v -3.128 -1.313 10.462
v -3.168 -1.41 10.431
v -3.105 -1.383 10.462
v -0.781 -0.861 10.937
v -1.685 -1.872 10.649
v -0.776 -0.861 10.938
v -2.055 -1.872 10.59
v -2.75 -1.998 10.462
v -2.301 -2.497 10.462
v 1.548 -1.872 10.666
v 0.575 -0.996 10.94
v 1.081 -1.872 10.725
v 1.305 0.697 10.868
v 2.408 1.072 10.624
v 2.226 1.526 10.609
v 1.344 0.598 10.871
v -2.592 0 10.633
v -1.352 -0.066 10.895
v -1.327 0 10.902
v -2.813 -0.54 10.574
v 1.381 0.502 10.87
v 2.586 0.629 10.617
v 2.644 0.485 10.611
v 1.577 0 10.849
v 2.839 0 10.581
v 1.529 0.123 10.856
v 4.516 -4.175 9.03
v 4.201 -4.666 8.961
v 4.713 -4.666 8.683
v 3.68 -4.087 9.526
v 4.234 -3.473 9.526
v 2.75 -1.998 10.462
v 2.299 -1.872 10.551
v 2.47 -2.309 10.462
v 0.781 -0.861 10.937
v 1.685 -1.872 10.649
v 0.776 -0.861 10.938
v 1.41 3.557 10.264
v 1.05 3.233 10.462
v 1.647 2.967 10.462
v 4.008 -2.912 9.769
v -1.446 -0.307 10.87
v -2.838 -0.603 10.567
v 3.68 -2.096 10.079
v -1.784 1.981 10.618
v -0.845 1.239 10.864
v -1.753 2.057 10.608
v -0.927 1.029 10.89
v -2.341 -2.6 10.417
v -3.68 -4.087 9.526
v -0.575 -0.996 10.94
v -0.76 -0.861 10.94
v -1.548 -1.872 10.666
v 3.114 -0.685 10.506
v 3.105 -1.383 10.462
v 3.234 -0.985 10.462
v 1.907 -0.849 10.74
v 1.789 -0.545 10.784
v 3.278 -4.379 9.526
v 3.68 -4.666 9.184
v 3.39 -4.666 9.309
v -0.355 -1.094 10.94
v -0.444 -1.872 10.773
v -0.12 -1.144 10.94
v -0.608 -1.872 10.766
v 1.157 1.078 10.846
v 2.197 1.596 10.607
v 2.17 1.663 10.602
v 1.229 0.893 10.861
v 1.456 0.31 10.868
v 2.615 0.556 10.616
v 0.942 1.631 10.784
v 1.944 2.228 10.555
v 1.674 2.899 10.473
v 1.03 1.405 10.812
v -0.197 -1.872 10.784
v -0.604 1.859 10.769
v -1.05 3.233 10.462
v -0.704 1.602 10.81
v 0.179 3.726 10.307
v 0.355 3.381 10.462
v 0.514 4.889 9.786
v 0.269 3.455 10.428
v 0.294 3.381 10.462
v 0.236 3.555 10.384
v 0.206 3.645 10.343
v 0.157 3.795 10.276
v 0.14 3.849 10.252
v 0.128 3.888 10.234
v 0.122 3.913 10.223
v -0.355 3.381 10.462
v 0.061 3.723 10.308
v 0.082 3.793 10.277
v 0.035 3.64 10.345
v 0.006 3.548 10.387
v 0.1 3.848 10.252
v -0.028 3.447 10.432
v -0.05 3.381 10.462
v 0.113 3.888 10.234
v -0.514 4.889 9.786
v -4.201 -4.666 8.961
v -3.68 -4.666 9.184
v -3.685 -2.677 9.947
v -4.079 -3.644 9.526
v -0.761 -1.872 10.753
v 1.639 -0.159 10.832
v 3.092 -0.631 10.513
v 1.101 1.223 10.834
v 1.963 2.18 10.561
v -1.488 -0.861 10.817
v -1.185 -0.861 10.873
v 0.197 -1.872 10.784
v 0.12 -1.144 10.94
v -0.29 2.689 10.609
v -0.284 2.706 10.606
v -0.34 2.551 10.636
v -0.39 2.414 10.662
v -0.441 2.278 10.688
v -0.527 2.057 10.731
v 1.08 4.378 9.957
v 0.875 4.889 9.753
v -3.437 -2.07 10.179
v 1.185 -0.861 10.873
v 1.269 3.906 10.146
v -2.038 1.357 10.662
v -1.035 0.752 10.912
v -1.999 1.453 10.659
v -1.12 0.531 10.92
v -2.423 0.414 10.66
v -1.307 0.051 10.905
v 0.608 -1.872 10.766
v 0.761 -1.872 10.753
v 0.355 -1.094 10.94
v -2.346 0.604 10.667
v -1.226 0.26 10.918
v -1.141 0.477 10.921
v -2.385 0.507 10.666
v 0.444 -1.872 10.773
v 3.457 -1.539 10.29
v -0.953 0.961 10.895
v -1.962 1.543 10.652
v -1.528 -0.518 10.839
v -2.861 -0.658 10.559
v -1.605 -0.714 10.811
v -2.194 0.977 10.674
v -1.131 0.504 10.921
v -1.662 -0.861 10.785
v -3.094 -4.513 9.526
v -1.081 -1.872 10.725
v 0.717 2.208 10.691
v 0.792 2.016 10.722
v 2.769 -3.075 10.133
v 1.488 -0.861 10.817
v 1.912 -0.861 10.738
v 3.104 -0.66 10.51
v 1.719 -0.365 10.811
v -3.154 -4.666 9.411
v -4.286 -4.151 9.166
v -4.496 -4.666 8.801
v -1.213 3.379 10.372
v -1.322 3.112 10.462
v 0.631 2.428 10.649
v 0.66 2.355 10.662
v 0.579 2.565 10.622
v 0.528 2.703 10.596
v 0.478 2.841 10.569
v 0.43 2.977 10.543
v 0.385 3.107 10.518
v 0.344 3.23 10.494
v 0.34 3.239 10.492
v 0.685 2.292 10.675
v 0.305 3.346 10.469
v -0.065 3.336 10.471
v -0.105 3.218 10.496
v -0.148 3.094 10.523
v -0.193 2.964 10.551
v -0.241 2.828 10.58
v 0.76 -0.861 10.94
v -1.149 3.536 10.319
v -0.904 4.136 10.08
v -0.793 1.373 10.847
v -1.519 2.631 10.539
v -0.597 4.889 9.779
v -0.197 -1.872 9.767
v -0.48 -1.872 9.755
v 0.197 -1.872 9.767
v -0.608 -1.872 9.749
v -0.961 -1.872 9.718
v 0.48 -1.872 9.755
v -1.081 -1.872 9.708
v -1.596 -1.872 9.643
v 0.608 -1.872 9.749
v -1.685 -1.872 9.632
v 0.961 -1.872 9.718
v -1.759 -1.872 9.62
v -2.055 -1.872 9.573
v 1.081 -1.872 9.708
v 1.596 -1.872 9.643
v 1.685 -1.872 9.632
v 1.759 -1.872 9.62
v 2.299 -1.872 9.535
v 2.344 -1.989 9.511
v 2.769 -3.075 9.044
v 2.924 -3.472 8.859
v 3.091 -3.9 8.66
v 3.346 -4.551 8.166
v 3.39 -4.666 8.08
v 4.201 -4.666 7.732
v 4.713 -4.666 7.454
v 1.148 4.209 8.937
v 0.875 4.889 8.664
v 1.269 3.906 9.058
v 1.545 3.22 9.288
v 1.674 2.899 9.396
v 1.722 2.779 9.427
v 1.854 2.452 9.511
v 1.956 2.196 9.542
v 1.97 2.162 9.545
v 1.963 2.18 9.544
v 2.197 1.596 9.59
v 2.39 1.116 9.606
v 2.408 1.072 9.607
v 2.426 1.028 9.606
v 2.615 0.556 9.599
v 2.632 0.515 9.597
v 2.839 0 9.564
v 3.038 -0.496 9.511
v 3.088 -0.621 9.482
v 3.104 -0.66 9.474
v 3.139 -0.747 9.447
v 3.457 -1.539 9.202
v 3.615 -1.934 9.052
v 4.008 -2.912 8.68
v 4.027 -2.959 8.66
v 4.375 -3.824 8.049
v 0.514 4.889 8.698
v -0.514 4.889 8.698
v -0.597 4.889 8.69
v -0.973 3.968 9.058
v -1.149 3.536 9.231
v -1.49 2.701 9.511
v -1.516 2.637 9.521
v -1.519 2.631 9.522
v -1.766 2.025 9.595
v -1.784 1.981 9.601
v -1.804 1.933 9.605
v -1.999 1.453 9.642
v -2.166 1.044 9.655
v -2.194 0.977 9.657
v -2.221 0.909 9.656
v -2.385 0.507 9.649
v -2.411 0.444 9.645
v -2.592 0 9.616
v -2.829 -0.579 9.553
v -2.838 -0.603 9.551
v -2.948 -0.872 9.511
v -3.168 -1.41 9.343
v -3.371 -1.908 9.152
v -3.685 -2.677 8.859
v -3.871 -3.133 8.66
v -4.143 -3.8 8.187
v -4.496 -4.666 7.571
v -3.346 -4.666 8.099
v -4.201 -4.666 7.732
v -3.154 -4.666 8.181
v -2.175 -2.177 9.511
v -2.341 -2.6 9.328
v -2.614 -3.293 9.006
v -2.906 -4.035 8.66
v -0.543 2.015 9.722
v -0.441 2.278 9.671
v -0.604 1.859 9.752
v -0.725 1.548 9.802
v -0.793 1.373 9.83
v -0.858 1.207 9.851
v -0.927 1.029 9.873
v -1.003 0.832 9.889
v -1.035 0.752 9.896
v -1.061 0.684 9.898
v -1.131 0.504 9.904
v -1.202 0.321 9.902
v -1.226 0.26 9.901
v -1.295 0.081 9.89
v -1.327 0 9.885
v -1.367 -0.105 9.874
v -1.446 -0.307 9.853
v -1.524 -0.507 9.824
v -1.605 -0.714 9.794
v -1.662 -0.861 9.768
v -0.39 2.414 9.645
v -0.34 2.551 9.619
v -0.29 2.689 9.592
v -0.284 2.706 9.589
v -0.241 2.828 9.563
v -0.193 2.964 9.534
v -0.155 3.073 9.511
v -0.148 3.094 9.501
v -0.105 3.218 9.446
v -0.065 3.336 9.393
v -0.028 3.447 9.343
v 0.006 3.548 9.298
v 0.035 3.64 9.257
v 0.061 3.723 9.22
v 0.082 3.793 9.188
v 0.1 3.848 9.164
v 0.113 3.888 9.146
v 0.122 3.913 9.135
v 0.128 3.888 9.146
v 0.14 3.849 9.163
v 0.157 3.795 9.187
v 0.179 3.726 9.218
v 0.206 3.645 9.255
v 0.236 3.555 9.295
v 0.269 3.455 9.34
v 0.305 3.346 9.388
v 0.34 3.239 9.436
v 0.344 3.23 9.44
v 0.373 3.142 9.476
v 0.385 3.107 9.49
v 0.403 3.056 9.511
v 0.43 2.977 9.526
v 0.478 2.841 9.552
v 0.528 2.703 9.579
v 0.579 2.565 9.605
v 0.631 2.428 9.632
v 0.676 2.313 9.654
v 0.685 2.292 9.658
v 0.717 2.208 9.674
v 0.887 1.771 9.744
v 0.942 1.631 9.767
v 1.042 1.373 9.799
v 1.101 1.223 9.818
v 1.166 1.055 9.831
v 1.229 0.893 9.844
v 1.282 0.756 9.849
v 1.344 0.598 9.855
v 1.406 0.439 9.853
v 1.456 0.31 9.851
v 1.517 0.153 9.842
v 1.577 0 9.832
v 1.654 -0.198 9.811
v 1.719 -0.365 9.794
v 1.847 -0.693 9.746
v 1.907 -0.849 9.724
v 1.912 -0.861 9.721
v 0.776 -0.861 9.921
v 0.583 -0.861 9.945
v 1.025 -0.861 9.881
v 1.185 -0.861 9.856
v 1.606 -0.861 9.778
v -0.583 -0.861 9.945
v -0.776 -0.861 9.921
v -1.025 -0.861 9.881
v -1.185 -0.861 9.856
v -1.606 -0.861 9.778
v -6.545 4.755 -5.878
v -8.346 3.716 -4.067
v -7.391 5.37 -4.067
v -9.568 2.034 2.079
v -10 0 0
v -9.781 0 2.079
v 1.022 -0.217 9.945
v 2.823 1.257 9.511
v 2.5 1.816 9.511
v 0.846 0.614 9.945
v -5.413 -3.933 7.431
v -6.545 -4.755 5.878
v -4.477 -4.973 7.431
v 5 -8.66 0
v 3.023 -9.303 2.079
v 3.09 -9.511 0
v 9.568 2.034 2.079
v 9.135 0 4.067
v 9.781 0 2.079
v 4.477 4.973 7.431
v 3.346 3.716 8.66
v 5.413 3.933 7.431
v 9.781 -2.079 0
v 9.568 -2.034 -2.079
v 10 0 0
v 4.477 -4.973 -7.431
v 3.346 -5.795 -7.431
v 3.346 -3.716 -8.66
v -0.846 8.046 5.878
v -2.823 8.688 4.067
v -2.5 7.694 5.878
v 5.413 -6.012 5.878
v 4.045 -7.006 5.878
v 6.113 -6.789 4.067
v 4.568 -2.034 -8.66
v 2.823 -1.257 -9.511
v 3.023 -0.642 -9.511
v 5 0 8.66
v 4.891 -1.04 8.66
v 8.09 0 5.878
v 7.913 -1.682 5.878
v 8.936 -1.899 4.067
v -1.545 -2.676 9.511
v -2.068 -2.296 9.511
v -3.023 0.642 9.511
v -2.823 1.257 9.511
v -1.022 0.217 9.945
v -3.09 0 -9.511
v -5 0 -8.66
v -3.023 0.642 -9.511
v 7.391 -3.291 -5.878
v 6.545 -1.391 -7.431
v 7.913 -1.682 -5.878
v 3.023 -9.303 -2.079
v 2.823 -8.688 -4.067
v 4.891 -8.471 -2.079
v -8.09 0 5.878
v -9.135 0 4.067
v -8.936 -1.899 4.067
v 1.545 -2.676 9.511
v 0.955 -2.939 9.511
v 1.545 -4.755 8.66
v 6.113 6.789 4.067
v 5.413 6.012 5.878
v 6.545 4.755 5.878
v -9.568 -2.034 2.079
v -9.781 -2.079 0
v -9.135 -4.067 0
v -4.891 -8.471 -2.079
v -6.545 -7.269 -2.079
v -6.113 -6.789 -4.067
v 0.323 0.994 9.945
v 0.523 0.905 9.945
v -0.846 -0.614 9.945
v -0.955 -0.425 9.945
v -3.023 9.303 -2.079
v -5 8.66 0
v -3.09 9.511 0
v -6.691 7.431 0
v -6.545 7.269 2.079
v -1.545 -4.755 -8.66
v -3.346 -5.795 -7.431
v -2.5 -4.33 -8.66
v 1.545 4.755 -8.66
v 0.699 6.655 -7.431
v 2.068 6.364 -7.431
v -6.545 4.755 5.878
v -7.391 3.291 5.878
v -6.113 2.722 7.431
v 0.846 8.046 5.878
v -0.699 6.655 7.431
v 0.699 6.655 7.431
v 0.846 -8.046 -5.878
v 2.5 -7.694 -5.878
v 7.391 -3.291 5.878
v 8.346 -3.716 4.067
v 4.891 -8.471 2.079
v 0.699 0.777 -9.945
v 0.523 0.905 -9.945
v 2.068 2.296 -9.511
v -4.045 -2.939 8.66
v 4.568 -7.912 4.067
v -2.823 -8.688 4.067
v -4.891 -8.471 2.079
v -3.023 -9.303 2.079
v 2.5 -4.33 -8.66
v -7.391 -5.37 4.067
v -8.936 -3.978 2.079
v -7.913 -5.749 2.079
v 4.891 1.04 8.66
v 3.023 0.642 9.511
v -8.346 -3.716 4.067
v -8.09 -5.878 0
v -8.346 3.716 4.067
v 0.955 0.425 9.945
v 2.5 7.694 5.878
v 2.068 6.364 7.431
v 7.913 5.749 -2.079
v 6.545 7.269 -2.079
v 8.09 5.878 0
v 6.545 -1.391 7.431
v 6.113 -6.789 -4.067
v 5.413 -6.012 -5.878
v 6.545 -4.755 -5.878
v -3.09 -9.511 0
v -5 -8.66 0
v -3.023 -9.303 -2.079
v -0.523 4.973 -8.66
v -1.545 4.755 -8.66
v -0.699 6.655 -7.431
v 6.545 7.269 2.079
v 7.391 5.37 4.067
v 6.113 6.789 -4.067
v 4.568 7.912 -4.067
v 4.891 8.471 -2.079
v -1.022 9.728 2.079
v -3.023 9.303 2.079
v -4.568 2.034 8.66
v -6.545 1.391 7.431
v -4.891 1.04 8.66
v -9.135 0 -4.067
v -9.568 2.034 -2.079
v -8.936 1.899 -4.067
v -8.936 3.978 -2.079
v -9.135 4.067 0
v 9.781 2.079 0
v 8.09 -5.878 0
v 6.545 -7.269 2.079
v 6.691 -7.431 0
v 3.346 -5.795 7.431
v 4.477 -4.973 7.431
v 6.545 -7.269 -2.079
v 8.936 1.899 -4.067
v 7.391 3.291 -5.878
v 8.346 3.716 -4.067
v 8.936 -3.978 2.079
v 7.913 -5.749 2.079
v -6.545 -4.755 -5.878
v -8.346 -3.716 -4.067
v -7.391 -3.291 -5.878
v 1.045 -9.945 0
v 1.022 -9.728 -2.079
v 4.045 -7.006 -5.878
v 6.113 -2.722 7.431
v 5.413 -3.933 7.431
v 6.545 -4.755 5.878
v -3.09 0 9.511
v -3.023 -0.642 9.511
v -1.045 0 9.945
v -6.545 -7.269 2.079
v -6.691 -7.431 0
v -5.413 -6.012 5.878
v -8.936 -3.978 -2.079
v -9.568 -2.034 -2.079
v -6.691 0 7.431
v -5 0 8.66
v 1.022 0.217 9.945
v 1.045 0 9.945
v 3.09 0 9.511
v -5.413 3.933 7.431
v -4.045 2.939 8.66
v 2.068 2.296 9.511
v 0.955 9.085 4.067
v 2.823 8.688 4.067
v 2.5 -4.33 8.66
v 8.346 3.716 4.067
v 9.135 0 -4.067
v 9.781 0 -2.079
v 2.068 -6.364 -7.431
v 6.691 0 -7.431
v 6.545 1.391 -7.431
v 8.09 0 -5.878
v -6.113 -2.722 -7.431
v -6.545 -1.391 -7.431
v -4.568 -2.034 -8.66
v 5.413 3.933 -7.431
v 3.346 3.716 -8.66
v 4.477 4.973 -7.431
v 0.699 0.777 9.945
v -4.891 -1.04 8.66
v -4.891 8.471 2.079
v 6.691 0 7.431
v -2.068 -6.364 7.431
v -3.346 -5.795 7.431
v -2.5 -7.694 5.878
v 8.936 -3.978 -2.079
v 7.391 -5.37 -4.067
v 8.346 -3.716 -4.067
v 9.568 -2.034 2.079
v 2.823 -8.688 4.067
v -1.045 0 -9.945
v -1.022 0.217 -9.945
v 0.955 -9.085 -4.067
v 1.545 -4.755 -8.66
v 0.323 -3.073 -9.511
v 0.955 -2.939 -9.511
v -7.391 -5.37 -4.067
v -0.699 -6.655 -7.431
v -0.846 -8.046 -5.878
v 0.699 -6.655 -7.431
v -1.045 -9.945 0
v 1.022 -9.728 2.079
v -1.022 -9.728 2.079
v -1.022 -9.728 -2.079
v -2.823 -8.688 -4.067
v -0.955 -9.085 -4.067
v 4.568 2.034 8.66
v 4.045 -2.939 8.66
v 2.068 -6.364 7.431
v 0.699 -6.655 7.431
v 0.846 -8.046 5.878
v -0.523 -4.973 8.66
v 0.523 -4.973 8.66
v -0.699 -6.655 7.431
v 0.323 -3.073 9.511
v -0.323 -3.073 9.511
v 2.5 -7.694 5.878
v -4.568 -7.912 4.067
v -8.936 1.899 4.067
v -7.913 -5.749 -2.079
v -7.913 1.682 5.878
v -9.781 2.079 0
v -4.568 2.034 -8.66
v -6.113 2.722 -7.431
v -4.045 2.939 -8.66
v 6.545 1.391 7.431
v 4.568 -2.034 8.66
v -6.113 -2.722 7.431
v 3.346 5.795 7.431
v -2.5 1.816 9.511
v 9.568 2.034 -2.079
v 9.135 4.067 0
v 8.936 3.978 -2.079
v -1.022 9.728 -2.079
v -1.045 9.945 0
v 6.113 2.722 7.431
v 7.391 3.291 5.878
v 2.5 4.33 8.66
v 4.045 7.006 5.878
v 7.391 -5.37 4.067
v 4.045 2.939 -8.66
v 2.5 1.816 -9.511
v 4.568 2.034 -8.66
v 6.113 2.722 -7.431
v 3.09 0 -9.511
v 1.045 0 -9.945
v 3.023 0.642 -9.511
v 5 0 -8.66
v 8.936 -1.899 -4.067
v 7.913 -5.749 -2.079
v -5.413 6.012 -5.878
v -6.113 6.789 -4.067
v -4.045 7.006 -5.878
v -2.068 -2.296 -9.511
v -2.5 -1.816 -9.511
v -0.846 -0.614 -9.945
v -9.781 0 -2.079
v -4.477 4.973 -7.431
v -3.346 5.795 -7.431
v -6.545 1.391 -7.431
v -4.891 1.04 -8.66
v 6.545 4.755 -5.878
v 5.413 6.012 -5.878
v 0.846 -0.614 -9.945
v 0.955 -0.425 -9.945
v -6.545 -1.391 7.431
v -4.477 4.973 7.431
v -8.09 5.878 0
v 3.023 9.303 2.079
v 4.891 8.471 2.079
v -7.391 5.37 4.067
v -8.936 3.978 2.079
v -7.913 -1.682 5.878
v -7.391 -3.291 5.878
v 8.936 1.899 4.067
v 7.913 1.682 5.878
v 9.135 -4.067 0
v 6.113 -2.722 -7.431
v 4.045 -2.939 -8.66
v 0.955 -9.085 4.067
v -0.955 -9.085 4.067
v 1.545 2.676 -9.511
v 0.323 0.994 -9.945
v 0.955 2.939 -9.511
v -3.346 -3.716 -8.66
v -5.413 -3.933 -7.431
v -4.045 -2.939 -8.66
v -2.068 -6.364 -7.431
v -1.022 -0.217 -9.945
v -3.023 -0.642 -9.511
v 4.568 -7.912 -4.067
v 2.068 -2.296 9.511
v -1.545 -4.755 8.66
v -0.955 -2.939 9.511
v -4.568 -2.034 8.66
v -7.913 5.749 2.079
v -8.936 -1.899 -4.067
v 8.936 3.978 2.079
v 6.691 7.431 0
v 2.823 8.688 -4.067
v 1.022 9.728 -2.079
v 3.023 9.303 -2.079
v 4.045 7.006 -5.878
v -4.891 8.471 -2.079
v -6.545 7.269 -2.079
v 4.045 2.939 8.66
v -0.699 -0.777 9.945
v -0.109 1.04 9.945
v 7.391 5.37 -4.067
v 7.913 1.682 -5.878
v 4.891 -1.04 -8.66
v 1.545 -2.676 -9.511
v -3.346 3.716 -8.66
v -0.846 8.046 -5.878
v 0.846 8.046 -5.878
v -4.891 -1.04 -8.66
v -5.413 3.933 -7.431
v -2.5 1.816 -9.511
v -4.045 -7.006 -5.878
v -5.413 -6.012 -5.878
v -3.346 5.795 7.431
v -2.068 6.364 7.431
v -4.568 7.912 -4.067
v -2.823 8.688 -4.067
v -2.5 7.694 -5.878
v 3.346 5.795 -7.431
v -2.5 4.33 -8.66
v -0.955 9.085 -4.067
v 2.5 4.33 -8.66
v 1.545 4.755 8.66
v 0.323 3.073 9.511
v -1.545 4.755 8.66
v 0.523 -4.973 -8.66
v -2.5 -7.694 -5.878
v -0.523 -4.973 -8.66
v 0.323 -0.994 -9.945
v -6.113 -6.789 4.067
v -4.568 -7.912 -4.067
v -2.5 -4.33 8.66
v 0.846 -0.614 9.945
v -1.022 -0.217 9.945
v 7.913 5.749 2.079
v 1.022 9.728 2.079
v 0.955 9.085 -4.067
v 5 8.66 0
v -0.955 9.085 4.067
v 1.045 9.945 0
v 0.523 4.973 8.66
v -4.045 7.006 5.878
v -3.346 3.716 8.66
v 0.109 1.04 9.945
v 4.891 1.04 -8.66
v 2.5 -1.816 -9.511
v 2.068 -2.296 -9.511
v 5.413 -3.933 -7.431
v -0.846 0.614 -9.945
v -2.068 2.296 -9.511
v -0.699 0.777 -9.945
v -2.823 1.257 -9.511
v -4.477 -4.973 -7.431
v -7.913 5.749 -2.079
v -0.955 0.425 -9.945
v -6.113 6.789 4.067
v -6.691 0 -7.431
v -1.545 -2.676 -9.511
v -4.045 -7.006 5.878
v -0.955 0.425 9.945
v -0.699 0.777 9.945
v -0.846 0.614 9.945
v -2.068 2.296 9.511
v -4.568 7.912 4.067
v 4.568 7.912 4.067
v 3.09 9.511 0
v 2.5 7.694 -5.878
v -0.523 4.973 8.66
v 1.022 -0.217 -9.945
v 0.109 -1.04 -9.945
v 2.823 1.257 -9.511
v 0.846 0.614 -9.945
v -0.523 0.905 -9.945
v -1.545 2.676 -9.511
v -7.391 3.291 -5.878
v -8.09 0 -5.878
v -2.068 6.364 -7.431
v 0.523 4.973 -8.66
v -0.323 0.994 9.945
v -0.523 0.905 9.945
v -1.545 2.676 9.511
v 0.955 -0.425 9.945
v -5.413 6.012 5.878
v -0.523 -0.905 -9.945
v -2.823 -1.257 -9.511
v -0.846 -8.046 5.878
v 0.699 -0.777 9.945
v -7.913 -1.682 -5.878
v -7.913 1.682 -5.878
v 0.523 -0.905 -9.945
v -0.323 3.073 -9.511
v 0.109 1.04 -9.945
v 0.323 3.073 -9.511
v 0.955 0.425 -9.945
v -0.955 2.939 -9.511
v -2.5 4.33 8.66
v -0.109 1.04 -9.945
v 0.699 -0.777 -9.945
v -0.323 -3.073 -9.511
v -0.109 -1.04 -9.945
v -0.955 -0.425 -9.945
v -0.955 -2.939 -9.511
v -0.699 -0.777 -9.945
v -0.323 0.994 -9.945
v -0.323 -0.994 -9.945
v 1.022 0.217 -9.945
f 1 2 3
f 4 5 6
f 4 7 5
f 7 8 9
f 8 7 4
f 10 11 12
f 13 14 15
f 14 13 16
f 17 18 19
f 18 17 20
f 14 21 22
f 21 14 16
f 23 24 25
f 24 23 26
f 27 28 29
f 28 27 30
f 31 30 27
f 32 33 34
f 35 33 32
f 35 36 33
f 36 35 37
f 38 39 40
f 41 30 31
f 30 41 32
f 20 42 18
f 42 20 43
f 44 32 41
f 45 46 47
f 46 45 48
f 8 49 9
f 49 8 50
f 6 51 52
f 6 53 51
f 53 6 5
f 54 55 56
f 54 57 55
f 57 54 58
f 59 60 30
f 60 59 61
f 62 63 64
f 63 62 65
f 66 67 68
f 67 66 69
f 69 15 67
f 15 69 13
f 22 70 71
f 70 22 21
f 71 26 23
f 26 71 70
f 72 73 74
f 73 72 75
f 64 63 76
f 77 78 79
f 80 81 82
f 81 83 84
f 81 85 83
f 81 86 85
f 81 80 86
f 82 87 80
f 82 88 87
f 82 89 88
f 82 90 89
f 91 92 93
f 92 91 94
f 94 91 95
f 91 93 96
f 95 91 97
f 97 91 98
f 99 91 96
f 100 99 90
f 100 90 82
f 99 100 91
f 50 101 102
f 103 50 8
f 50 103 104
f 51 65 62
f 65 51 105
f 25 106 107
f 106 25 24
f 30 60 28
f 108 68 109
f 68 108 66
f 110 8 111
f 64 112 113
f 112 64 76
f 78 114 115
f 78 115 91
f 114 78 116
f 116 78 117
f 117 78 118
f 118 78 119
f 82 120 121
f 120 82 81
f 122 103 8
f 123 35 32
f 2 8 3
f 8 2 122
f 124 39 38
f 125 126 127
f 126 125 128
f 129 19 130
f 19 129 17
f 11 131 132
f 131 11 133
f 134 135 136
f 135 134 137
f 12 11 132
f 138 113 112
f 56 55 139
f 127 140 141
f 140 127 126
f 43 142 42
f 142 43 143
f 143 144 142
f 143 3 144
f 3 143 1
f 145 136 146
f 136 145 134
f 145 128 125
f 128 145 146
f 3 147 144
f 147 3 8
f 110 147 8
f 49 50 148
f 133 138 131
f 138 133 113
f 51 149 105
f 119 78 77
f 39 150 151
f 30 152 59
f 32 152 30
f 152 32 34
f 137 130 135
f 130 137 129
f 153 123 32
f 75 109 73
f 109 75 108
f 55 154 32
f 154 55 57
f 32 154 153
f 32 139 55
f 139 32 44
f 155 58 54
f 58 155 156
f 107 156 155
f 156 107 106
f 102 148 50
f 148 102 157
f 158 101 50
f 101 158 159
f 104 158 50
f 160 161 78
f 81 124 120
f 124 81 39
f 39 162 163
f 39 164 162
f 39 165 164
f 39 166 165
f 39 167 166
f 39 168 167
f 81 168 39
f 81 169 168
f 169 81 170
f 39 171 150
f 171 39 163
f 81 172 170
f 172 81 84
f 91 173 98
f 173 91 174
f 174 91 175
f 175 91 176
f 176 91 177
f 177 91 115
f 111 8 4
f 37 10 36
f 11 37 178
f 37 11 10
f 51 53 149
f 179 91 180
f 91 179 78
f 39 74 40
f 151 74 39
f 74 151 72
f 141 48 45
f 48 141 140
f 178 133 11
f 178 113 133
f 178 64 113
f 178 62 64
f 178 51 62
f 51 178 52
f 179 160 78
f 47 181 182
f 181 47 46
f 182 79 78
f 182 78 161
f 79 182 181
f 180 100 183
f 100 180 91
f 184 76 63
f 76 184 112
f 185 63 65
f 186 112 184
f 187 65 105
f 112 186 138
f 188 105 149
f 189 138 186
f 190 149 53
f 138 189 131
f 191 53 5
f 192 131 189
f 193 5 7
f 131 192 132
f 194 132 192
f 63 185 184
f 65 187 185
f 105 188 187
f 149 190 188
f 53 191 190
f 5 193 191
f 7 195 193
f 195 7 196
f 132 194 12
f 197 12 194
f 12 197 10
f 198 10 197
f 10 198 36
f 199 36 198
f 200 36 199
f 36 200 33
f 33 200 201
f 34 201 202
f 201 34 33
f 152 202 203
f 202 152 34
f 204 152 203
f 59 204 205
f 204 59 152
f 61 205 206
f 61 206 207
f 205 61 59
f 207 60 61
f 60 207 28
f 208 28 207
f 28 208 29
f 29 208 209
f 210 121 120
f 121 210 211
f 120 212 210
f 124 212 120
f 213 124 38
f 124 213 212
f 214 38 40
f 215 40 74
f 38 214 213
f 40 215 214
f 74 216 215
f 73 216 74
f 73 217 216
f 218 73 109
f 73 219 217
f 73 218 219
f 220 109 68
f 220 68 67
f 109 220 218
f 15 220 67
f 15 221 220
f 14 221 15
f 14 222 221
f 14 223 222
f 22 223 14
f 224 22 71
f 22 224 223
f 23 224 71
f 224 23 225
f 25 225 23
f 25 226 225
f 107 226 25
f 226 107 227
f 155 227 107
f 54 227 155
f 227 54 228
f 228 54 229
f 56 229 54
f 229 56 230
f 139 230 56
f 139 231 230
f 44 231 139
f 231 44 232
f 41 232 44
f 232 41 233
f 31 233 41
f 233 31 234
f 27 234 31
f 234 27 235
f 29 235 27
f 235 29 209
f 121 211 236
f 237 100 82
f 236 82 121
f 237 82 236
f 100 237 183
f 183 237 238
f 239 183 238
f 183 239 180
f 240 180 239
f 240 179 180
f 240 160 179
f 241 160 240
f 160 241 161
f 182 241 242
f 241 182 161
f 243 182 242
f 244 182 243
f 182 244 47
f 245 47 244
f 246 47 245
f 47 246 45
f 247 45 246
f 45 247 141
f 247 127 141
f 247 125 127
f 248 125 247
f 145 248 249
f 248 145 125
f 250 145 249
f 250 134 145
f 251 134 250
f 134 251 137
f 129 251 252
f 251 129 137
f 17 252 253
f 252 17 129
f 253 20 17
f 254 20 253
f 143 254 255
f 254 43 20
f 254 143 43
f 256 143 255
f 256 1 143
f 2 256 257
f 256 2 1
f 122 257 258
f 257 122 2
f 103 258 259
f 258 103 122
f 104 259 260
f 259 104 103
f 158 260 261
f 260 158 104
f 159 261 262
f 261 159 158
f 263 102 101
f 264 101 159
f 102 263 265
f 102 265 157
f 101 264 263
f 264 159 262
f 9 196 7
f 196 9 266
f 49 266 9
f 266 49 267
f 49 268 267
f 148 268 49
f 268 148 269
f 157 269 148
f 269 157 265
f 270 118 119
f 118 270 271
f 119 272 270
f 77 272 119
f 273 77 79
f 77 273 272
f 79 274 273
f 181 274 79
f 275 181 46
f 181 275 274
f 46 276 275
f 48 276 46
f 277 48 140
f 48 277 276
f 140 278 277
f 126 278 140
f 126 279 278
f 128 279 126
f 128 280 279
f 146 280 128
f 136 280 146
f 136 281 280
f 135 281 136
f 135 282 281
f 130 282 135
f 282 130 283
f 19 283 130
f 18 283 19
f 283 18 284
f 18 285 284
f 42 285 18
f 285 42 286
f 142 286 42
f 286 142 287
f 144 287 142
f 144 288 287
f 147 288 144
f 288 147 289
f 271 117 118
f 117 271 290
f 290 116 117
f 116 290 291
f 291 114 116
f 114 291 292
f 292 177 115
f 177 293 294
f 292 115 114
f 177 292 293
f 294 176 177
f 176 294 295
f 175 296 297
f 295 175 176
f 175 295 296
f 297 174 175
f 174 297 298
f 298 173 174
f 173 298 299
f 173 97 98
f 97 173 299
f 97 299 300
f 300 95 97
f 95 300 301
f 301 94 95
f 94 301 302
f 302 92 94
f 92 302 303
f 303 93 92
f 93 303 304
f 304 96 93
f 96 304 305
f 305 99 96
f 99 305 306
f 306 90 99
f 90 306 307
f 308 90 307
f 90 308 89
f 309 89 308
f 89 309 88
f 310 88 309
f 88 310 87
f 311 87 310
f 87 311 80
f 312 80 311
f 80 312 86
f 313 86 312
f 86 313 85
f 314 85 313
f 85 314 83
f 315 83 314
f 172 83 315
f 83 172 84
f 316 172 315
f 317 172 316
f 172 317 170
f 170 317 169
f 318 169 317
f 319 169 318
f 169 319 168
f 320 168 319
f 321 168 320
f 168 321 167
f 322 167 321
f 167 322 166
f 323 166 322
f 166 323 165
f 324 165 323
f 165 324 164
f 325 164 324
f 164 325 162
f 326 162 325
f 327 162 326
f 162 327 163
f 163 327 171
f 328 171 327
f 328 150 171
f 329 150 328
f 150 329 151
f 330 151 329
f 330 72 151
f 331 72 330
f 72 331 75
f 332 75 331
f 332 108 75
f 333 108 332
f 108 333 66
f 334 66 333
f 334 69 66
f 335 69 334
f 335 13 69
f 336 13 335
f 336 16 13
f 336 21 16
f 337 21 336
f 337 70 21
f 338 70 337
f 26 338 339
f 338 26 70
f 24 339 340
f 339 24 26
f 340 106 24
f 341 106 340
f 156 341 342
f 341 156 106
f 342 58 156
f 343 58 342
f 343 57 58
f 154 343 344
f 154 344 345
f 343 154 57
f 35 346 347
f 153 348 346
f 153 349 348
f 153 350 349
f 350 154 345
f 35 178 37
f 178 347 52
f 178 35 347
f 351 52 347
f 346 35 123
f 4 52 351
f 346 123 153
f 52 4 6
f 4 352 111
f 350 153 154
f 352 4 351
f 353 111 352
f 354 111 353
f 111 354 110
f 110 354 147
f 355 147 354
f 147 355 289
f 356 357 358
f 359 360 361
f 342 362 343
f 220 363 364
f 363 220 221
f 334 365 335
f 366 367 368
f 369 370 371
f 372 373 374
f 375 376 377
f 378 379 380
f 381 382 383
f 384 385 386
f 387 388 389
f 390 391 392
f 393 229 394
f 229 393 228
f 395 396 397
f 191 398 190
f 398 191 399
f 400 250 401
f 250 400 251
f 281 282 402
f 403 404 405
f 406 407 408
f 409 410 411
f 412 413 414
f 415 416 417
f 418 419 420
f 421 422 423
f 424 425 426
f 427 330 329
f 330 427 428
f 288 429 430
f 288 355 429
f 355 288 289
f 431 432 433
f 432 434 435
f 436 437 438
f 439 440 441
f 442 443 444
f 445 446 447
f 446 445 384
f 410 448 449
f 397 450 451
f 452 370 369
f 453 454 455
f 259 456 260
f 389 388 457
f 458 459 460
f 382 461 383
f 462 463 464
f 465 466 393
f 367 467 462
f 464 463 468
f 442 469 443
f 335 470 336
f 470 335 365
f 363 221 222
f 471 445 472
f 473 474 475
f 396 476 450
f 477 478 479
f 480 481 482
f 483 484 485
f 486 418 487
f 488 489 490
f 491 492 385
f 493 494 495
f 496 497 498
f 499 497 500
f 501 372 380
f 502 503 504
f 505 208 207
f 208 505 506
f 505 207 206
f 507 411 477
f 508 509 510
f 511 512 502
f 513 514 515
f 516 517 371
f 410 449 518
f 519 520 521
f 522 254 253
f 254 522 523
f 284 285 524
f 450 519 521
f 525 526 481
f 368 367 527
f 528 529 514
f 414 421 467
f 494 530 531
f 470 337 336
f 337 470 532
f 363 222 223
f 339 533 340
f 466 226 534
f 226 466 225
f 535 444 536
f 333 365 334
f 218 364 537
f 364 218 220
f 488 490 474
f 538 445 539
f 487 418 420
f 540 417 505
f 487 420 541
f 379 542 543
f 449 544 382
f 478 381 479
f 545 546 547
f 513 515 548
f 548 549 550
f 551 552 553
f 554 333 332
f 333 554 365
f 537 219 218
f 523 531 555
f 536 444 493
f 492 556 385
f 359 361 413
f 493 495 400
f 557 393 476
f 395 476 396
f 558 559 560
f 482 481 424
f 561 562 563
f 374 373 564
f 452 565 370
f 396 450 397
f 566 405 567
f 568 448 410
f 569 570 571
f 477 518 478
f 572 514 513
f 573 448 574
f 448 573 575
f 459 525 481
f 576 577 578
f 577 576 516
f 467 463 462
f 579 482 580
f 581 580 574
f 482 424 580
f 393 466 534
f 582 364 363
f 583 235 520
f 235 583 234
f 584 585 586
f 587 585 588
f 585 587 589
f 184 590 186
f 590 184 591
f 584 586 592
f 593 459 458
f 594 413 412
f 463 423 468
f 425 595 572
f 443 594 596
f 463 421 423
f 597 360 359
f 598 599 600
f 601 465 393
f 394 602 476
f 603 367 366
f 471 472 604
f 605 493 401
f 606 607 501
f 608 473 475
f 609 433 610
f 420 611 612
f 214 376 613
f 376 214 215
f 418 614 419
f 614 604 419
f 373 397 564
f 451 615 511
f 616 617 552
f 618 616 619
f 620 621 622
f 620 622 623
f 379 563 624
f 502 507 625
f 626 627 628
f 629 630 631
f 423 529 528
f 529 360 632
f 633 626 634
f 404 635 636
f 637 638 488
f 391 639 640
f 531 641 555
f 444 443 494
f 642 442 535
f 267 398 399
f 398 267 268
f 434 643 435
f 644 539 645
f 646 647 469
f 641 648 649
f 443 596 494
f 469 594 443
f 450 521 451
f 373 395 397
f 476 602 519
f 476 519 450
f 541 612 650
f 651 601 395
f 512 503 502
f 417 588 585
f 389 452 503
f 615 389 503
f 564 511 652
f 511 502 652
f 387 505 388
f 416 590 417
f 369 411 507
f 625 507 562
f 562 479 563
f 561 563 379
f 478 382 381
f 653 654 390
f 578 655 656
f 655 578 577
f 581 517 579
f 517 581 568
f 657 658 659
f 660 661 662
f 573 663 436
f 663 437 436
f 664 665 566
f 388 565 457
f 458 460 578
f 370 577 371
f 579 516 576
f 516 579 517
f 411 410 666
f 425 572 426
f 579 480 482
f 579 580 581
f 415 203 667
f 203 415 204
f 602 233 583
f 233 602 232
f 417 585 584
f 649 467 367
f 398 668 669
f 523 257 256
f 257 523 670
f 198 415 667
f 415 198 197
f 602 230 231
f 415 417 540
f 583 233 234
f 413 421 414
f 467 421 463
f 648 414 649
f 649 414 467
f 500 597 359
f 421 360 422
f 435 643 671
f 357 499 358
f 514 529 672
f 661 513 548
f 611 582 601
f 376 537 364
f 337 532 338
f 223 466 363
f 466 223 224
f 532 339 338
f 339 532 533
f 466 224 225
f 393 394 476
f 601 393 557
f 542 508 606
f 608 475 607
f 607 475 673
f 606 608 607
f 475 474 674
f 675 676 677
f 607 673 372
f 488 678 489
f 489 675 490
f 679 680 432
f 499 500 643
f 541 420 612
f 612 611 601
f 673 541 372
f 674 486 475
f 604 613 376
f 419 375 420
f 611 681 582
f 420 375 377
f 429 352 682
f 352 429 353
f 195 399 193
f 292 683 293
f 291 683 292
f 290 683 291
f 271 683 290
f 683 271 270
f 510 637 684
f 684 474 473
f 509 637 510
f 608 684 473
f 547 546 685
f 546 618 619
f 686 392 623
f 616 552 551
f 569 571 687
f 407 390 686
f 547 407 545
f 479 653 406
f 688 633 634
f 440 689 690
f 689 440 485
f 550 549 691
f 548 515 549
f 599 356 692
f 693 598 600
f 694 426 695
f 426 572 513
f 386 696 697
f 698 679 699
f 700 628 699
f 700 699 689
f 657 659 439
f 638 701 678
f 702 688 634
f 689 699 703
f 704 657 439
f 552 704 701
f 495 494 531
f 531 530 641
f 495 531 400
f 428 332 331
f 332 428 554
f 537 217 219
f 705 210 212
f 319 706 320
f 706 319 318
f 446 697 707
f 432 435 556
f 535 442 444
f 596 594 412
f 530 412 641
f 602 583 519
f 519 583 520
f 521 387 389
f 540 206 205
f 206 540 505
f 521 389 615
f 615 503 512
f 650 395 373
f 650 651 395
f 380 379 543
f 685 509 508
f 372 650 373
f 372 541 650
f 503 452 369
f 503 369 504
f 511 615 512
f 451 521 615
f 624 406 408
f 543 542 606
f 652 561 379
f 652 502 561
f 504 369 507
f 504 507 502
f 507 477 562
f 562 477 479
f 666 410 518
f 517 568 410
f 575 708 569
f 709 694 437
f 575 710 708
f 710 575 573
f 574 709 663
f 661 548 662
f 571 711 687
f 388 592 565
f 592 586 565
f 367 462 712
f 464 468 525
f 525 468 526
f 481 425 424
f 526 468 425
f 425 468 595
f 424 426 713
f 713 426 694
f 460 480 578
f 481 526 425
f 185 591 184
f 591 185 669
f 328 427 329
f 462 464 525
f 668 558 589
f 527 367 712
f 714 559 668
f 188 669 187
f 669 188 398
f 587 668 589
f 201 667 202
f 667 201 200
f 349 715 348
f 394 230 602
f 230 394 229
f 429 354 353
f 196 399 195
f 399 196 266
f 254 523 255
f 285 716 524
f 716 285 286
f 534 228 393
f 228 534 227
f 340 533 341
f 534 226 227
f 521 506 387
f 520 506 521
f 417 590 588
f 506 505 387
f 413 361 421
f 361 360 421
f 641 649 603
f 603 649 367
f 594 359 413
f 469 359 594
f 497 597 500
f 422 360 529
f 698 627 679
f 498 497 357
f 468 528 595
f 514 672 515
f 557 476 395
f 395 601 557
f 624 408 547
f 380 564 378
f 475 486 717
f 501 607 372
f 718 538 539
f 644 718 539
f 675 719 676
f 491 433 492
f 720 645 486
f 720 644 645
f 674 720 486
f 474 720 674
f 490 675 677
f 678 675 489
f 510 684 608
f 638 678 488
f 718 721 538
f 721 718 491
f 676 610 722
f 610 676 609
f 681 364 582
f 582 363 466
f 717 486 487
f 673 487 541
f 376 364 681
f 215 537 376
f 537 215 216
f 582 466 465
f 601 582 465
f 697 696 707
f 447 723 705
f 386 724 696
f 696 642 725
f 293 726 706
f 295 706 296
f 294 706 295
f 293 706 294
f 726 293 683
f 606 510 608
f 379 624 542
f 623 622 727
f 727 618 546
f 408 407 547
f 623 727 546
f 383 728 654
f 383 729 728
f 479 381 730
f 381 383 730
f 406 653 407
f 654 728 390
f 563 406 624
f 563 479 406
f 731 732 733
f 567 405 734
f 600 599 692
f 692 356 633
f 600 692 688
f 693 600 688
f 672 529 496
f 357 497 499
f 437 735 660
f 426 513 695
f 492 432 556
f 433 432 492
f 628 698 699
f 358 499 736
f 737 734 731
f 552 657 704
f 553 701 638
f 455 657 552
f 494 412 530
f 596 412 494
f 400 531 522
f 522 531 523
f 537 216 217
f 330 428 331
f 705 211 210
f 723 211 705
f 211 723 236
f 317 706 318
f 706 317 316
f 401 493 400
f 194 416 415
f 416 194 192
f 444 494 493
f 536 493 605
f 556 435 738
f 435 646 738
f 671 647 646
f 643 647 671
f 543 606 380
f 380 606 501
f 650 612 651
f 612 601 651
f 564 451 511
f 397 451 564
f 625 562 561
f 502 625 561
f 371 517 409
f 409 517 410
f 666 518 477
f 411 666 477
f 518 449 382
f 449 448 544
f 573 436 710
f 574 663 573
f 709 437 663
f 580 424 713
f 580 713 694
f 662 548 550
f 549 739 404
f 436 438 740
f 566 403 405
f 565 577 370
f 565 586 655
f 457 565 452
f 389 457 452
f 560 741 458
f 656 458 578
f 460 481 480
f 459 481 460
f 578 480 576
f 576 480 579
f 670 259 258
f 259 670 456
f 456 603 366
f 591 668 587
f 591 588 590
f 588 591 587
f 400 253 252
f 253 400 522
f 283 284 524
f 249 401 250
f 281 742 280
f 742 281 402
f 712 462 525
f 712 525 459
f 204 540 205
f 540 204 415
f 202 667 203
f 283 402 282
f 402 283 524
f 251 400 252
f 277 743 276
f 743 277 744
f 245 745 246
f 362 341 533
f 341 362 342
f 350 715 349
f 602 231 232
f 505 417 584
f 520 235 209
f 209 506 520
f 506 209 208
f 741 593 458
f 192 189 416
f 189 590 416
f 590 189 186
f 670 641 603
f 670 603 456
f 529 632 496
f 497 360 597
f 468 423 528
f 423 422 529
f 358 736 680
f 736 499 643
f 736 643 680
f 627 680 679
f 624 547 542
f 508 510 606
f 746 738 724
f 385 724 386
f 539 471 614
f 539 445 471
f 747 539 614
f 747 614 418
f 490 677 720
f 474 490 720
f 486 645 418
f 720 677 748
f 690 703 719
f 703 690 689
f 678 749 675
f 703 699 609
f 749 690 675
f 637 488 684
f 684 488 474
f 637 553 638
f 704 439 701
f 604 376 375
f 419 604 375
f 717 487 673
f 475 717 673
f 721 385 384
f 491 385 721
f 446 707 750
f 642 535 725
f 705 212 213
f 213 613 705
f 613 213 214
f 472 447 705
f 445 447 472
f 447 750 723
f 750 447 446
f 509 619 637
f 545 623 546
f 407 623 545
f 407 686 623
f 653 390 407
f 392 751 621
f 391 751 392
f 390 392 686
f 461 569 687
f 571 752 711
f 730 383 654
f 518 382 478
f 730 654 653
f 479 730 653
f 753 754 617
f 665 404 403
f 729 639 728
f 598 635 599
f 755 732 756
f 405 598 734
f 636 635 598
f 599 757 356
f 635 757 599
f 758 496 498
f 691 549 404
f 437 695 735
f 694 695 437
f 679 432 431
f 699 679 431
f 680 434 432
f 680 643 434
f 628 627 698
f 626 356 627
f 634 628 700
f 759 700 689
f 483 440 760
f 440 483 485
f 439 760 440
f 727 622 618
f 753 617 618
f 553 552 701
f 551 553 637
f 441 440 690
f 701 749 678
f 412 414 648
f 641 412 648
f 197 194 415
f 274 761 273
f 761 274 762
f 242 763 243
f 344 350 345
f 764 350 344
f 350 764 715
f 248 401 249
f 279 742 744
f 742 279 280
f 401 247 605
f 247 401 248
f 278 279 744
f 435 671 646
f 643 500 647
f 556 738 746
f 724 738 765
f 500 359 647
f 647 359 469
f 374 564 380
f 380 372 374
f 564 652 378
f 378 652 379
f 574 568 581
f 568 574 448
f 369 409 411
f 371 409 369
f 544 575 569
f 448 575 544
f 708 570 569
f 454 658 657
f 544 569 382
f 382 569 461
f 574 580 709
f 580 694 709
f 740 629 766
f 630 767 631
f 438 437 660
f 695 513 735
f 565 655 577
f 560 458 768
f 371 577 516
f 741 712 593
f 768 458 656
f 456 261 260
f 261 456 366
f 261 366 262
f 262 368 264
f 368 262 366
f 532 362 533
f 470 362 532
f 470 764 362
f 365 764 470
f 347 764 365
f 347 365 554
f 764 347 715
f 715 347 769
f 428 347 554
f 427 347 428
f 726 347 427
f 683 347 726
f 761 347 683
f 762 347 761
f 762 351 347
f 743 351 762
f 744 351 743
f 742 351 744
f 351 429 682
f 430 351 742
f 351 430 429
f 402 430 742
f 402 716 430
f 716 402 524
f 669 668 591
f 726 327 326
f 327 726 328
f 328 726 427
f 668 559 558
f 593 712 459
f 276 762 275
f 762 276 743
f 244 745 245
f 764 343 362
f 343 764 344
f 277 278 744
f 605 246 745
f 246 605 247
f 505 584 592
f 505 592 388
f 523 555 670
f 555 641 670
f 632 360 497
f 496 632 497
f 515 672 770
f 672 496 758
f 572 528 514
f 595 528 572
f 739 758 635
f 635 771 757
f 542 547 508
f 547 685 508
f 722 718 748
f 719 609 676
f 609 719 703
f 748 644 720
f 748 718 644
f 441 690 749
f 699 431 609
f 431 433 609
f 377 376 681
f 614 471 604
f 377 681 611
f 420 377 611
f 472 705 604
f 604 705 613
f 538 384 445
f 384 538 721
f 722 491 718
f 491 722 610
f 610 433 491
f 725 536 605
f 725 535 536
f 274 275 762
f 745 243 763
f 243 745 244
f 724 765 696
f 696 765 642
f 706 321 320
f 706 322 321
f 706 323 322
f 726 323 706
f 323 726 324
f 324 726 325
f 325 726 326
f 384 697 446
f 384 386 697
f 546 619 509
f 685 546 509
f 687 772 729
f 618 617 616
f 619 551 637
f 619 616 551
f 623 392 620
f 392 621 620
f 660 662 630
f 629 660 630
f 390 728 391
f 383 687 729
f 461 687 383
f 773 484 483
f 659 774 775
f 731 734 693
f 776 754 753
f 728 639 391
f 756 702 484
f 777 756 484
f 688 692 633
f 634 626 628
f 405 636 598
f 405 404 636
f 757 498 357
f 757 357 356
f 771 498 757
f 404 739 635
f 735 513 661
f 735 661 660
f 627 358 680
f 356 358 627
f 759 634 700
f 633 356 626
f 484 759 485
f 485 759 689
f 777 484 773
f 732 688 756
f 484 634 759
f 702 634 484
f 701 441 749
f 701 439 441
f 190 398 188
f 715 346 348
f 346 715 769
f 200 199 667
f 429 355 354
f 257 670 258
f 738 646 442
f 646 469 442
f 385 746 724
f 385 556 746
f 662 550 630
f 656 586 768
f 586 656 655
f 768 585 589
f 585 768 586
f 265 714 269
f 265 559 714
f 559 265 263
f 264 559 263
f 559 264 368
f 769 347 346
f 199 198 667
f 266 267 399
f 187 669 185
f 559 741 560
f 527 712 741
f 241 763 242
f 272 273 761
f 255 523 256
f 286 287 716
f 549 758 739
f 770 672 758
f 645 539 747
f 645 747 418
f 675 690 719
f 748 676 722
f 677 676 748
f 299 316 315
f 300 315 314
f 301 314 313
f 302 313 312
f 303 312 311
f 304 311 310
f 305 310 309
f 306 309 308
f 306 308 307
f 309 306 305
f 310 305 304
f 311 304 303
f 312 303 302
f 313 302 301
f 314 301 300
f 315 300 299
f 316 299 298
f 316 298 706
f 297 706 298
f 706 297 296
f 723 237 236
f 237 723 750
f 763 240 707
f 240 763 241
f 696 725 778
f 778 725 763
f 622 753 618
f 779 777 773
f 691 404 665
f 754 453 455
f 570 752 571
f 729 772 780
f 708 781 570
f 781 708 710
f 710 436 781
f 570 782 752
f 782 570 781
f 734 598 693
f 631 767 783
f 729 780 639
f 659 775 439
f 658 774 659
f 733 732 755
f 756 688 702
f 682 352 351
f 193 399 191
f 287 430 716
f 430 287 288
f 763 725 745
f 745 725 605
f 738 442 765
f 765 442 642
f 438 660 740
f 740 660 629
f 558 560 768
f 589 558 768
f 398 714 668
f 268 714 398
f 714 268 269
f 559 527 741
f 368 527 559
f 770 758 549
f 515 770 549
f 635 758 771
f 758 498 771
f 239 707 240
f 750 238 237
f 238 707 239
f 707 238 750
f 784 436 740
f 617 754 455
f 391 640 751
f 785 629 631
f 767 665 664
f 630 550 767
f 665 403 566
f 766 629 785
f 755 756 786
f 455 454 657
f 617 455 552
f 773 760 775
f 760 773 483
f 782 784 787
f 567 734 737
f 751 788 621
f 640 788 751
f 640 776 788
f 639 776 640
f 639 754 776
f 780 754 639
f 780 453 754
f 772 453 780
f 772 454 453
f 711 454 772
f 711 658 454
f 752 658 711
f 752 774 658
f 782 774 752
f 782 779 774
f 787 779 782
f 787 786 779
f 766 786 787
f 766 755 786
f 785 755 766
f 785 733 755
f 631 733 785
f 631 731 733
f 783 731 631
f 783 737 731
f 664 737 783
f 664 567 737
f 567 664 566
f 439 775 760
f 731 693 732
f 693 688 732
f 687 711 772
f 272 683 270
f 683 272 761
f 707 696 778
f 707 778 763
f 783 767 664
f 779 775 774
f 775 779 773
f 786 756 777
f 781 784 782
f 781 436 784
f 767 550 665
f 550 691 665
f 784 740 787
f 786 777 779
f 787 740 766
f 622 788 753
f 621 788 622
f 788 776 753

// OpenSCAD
character = "A";
font_size = 10;
thickness = 1;

sphere(font_size);
intersection() {
    sphere(font_size + thickness);
    linear_extrude(font_size * 2) 
        text(character, 
             size = font_size,   // 文字大小
             valign = "center",  // 垂直置中
             halign = "center"   // 水平置中
        );
}
// 預覽會顯示怪怪的，記得F6渲染
